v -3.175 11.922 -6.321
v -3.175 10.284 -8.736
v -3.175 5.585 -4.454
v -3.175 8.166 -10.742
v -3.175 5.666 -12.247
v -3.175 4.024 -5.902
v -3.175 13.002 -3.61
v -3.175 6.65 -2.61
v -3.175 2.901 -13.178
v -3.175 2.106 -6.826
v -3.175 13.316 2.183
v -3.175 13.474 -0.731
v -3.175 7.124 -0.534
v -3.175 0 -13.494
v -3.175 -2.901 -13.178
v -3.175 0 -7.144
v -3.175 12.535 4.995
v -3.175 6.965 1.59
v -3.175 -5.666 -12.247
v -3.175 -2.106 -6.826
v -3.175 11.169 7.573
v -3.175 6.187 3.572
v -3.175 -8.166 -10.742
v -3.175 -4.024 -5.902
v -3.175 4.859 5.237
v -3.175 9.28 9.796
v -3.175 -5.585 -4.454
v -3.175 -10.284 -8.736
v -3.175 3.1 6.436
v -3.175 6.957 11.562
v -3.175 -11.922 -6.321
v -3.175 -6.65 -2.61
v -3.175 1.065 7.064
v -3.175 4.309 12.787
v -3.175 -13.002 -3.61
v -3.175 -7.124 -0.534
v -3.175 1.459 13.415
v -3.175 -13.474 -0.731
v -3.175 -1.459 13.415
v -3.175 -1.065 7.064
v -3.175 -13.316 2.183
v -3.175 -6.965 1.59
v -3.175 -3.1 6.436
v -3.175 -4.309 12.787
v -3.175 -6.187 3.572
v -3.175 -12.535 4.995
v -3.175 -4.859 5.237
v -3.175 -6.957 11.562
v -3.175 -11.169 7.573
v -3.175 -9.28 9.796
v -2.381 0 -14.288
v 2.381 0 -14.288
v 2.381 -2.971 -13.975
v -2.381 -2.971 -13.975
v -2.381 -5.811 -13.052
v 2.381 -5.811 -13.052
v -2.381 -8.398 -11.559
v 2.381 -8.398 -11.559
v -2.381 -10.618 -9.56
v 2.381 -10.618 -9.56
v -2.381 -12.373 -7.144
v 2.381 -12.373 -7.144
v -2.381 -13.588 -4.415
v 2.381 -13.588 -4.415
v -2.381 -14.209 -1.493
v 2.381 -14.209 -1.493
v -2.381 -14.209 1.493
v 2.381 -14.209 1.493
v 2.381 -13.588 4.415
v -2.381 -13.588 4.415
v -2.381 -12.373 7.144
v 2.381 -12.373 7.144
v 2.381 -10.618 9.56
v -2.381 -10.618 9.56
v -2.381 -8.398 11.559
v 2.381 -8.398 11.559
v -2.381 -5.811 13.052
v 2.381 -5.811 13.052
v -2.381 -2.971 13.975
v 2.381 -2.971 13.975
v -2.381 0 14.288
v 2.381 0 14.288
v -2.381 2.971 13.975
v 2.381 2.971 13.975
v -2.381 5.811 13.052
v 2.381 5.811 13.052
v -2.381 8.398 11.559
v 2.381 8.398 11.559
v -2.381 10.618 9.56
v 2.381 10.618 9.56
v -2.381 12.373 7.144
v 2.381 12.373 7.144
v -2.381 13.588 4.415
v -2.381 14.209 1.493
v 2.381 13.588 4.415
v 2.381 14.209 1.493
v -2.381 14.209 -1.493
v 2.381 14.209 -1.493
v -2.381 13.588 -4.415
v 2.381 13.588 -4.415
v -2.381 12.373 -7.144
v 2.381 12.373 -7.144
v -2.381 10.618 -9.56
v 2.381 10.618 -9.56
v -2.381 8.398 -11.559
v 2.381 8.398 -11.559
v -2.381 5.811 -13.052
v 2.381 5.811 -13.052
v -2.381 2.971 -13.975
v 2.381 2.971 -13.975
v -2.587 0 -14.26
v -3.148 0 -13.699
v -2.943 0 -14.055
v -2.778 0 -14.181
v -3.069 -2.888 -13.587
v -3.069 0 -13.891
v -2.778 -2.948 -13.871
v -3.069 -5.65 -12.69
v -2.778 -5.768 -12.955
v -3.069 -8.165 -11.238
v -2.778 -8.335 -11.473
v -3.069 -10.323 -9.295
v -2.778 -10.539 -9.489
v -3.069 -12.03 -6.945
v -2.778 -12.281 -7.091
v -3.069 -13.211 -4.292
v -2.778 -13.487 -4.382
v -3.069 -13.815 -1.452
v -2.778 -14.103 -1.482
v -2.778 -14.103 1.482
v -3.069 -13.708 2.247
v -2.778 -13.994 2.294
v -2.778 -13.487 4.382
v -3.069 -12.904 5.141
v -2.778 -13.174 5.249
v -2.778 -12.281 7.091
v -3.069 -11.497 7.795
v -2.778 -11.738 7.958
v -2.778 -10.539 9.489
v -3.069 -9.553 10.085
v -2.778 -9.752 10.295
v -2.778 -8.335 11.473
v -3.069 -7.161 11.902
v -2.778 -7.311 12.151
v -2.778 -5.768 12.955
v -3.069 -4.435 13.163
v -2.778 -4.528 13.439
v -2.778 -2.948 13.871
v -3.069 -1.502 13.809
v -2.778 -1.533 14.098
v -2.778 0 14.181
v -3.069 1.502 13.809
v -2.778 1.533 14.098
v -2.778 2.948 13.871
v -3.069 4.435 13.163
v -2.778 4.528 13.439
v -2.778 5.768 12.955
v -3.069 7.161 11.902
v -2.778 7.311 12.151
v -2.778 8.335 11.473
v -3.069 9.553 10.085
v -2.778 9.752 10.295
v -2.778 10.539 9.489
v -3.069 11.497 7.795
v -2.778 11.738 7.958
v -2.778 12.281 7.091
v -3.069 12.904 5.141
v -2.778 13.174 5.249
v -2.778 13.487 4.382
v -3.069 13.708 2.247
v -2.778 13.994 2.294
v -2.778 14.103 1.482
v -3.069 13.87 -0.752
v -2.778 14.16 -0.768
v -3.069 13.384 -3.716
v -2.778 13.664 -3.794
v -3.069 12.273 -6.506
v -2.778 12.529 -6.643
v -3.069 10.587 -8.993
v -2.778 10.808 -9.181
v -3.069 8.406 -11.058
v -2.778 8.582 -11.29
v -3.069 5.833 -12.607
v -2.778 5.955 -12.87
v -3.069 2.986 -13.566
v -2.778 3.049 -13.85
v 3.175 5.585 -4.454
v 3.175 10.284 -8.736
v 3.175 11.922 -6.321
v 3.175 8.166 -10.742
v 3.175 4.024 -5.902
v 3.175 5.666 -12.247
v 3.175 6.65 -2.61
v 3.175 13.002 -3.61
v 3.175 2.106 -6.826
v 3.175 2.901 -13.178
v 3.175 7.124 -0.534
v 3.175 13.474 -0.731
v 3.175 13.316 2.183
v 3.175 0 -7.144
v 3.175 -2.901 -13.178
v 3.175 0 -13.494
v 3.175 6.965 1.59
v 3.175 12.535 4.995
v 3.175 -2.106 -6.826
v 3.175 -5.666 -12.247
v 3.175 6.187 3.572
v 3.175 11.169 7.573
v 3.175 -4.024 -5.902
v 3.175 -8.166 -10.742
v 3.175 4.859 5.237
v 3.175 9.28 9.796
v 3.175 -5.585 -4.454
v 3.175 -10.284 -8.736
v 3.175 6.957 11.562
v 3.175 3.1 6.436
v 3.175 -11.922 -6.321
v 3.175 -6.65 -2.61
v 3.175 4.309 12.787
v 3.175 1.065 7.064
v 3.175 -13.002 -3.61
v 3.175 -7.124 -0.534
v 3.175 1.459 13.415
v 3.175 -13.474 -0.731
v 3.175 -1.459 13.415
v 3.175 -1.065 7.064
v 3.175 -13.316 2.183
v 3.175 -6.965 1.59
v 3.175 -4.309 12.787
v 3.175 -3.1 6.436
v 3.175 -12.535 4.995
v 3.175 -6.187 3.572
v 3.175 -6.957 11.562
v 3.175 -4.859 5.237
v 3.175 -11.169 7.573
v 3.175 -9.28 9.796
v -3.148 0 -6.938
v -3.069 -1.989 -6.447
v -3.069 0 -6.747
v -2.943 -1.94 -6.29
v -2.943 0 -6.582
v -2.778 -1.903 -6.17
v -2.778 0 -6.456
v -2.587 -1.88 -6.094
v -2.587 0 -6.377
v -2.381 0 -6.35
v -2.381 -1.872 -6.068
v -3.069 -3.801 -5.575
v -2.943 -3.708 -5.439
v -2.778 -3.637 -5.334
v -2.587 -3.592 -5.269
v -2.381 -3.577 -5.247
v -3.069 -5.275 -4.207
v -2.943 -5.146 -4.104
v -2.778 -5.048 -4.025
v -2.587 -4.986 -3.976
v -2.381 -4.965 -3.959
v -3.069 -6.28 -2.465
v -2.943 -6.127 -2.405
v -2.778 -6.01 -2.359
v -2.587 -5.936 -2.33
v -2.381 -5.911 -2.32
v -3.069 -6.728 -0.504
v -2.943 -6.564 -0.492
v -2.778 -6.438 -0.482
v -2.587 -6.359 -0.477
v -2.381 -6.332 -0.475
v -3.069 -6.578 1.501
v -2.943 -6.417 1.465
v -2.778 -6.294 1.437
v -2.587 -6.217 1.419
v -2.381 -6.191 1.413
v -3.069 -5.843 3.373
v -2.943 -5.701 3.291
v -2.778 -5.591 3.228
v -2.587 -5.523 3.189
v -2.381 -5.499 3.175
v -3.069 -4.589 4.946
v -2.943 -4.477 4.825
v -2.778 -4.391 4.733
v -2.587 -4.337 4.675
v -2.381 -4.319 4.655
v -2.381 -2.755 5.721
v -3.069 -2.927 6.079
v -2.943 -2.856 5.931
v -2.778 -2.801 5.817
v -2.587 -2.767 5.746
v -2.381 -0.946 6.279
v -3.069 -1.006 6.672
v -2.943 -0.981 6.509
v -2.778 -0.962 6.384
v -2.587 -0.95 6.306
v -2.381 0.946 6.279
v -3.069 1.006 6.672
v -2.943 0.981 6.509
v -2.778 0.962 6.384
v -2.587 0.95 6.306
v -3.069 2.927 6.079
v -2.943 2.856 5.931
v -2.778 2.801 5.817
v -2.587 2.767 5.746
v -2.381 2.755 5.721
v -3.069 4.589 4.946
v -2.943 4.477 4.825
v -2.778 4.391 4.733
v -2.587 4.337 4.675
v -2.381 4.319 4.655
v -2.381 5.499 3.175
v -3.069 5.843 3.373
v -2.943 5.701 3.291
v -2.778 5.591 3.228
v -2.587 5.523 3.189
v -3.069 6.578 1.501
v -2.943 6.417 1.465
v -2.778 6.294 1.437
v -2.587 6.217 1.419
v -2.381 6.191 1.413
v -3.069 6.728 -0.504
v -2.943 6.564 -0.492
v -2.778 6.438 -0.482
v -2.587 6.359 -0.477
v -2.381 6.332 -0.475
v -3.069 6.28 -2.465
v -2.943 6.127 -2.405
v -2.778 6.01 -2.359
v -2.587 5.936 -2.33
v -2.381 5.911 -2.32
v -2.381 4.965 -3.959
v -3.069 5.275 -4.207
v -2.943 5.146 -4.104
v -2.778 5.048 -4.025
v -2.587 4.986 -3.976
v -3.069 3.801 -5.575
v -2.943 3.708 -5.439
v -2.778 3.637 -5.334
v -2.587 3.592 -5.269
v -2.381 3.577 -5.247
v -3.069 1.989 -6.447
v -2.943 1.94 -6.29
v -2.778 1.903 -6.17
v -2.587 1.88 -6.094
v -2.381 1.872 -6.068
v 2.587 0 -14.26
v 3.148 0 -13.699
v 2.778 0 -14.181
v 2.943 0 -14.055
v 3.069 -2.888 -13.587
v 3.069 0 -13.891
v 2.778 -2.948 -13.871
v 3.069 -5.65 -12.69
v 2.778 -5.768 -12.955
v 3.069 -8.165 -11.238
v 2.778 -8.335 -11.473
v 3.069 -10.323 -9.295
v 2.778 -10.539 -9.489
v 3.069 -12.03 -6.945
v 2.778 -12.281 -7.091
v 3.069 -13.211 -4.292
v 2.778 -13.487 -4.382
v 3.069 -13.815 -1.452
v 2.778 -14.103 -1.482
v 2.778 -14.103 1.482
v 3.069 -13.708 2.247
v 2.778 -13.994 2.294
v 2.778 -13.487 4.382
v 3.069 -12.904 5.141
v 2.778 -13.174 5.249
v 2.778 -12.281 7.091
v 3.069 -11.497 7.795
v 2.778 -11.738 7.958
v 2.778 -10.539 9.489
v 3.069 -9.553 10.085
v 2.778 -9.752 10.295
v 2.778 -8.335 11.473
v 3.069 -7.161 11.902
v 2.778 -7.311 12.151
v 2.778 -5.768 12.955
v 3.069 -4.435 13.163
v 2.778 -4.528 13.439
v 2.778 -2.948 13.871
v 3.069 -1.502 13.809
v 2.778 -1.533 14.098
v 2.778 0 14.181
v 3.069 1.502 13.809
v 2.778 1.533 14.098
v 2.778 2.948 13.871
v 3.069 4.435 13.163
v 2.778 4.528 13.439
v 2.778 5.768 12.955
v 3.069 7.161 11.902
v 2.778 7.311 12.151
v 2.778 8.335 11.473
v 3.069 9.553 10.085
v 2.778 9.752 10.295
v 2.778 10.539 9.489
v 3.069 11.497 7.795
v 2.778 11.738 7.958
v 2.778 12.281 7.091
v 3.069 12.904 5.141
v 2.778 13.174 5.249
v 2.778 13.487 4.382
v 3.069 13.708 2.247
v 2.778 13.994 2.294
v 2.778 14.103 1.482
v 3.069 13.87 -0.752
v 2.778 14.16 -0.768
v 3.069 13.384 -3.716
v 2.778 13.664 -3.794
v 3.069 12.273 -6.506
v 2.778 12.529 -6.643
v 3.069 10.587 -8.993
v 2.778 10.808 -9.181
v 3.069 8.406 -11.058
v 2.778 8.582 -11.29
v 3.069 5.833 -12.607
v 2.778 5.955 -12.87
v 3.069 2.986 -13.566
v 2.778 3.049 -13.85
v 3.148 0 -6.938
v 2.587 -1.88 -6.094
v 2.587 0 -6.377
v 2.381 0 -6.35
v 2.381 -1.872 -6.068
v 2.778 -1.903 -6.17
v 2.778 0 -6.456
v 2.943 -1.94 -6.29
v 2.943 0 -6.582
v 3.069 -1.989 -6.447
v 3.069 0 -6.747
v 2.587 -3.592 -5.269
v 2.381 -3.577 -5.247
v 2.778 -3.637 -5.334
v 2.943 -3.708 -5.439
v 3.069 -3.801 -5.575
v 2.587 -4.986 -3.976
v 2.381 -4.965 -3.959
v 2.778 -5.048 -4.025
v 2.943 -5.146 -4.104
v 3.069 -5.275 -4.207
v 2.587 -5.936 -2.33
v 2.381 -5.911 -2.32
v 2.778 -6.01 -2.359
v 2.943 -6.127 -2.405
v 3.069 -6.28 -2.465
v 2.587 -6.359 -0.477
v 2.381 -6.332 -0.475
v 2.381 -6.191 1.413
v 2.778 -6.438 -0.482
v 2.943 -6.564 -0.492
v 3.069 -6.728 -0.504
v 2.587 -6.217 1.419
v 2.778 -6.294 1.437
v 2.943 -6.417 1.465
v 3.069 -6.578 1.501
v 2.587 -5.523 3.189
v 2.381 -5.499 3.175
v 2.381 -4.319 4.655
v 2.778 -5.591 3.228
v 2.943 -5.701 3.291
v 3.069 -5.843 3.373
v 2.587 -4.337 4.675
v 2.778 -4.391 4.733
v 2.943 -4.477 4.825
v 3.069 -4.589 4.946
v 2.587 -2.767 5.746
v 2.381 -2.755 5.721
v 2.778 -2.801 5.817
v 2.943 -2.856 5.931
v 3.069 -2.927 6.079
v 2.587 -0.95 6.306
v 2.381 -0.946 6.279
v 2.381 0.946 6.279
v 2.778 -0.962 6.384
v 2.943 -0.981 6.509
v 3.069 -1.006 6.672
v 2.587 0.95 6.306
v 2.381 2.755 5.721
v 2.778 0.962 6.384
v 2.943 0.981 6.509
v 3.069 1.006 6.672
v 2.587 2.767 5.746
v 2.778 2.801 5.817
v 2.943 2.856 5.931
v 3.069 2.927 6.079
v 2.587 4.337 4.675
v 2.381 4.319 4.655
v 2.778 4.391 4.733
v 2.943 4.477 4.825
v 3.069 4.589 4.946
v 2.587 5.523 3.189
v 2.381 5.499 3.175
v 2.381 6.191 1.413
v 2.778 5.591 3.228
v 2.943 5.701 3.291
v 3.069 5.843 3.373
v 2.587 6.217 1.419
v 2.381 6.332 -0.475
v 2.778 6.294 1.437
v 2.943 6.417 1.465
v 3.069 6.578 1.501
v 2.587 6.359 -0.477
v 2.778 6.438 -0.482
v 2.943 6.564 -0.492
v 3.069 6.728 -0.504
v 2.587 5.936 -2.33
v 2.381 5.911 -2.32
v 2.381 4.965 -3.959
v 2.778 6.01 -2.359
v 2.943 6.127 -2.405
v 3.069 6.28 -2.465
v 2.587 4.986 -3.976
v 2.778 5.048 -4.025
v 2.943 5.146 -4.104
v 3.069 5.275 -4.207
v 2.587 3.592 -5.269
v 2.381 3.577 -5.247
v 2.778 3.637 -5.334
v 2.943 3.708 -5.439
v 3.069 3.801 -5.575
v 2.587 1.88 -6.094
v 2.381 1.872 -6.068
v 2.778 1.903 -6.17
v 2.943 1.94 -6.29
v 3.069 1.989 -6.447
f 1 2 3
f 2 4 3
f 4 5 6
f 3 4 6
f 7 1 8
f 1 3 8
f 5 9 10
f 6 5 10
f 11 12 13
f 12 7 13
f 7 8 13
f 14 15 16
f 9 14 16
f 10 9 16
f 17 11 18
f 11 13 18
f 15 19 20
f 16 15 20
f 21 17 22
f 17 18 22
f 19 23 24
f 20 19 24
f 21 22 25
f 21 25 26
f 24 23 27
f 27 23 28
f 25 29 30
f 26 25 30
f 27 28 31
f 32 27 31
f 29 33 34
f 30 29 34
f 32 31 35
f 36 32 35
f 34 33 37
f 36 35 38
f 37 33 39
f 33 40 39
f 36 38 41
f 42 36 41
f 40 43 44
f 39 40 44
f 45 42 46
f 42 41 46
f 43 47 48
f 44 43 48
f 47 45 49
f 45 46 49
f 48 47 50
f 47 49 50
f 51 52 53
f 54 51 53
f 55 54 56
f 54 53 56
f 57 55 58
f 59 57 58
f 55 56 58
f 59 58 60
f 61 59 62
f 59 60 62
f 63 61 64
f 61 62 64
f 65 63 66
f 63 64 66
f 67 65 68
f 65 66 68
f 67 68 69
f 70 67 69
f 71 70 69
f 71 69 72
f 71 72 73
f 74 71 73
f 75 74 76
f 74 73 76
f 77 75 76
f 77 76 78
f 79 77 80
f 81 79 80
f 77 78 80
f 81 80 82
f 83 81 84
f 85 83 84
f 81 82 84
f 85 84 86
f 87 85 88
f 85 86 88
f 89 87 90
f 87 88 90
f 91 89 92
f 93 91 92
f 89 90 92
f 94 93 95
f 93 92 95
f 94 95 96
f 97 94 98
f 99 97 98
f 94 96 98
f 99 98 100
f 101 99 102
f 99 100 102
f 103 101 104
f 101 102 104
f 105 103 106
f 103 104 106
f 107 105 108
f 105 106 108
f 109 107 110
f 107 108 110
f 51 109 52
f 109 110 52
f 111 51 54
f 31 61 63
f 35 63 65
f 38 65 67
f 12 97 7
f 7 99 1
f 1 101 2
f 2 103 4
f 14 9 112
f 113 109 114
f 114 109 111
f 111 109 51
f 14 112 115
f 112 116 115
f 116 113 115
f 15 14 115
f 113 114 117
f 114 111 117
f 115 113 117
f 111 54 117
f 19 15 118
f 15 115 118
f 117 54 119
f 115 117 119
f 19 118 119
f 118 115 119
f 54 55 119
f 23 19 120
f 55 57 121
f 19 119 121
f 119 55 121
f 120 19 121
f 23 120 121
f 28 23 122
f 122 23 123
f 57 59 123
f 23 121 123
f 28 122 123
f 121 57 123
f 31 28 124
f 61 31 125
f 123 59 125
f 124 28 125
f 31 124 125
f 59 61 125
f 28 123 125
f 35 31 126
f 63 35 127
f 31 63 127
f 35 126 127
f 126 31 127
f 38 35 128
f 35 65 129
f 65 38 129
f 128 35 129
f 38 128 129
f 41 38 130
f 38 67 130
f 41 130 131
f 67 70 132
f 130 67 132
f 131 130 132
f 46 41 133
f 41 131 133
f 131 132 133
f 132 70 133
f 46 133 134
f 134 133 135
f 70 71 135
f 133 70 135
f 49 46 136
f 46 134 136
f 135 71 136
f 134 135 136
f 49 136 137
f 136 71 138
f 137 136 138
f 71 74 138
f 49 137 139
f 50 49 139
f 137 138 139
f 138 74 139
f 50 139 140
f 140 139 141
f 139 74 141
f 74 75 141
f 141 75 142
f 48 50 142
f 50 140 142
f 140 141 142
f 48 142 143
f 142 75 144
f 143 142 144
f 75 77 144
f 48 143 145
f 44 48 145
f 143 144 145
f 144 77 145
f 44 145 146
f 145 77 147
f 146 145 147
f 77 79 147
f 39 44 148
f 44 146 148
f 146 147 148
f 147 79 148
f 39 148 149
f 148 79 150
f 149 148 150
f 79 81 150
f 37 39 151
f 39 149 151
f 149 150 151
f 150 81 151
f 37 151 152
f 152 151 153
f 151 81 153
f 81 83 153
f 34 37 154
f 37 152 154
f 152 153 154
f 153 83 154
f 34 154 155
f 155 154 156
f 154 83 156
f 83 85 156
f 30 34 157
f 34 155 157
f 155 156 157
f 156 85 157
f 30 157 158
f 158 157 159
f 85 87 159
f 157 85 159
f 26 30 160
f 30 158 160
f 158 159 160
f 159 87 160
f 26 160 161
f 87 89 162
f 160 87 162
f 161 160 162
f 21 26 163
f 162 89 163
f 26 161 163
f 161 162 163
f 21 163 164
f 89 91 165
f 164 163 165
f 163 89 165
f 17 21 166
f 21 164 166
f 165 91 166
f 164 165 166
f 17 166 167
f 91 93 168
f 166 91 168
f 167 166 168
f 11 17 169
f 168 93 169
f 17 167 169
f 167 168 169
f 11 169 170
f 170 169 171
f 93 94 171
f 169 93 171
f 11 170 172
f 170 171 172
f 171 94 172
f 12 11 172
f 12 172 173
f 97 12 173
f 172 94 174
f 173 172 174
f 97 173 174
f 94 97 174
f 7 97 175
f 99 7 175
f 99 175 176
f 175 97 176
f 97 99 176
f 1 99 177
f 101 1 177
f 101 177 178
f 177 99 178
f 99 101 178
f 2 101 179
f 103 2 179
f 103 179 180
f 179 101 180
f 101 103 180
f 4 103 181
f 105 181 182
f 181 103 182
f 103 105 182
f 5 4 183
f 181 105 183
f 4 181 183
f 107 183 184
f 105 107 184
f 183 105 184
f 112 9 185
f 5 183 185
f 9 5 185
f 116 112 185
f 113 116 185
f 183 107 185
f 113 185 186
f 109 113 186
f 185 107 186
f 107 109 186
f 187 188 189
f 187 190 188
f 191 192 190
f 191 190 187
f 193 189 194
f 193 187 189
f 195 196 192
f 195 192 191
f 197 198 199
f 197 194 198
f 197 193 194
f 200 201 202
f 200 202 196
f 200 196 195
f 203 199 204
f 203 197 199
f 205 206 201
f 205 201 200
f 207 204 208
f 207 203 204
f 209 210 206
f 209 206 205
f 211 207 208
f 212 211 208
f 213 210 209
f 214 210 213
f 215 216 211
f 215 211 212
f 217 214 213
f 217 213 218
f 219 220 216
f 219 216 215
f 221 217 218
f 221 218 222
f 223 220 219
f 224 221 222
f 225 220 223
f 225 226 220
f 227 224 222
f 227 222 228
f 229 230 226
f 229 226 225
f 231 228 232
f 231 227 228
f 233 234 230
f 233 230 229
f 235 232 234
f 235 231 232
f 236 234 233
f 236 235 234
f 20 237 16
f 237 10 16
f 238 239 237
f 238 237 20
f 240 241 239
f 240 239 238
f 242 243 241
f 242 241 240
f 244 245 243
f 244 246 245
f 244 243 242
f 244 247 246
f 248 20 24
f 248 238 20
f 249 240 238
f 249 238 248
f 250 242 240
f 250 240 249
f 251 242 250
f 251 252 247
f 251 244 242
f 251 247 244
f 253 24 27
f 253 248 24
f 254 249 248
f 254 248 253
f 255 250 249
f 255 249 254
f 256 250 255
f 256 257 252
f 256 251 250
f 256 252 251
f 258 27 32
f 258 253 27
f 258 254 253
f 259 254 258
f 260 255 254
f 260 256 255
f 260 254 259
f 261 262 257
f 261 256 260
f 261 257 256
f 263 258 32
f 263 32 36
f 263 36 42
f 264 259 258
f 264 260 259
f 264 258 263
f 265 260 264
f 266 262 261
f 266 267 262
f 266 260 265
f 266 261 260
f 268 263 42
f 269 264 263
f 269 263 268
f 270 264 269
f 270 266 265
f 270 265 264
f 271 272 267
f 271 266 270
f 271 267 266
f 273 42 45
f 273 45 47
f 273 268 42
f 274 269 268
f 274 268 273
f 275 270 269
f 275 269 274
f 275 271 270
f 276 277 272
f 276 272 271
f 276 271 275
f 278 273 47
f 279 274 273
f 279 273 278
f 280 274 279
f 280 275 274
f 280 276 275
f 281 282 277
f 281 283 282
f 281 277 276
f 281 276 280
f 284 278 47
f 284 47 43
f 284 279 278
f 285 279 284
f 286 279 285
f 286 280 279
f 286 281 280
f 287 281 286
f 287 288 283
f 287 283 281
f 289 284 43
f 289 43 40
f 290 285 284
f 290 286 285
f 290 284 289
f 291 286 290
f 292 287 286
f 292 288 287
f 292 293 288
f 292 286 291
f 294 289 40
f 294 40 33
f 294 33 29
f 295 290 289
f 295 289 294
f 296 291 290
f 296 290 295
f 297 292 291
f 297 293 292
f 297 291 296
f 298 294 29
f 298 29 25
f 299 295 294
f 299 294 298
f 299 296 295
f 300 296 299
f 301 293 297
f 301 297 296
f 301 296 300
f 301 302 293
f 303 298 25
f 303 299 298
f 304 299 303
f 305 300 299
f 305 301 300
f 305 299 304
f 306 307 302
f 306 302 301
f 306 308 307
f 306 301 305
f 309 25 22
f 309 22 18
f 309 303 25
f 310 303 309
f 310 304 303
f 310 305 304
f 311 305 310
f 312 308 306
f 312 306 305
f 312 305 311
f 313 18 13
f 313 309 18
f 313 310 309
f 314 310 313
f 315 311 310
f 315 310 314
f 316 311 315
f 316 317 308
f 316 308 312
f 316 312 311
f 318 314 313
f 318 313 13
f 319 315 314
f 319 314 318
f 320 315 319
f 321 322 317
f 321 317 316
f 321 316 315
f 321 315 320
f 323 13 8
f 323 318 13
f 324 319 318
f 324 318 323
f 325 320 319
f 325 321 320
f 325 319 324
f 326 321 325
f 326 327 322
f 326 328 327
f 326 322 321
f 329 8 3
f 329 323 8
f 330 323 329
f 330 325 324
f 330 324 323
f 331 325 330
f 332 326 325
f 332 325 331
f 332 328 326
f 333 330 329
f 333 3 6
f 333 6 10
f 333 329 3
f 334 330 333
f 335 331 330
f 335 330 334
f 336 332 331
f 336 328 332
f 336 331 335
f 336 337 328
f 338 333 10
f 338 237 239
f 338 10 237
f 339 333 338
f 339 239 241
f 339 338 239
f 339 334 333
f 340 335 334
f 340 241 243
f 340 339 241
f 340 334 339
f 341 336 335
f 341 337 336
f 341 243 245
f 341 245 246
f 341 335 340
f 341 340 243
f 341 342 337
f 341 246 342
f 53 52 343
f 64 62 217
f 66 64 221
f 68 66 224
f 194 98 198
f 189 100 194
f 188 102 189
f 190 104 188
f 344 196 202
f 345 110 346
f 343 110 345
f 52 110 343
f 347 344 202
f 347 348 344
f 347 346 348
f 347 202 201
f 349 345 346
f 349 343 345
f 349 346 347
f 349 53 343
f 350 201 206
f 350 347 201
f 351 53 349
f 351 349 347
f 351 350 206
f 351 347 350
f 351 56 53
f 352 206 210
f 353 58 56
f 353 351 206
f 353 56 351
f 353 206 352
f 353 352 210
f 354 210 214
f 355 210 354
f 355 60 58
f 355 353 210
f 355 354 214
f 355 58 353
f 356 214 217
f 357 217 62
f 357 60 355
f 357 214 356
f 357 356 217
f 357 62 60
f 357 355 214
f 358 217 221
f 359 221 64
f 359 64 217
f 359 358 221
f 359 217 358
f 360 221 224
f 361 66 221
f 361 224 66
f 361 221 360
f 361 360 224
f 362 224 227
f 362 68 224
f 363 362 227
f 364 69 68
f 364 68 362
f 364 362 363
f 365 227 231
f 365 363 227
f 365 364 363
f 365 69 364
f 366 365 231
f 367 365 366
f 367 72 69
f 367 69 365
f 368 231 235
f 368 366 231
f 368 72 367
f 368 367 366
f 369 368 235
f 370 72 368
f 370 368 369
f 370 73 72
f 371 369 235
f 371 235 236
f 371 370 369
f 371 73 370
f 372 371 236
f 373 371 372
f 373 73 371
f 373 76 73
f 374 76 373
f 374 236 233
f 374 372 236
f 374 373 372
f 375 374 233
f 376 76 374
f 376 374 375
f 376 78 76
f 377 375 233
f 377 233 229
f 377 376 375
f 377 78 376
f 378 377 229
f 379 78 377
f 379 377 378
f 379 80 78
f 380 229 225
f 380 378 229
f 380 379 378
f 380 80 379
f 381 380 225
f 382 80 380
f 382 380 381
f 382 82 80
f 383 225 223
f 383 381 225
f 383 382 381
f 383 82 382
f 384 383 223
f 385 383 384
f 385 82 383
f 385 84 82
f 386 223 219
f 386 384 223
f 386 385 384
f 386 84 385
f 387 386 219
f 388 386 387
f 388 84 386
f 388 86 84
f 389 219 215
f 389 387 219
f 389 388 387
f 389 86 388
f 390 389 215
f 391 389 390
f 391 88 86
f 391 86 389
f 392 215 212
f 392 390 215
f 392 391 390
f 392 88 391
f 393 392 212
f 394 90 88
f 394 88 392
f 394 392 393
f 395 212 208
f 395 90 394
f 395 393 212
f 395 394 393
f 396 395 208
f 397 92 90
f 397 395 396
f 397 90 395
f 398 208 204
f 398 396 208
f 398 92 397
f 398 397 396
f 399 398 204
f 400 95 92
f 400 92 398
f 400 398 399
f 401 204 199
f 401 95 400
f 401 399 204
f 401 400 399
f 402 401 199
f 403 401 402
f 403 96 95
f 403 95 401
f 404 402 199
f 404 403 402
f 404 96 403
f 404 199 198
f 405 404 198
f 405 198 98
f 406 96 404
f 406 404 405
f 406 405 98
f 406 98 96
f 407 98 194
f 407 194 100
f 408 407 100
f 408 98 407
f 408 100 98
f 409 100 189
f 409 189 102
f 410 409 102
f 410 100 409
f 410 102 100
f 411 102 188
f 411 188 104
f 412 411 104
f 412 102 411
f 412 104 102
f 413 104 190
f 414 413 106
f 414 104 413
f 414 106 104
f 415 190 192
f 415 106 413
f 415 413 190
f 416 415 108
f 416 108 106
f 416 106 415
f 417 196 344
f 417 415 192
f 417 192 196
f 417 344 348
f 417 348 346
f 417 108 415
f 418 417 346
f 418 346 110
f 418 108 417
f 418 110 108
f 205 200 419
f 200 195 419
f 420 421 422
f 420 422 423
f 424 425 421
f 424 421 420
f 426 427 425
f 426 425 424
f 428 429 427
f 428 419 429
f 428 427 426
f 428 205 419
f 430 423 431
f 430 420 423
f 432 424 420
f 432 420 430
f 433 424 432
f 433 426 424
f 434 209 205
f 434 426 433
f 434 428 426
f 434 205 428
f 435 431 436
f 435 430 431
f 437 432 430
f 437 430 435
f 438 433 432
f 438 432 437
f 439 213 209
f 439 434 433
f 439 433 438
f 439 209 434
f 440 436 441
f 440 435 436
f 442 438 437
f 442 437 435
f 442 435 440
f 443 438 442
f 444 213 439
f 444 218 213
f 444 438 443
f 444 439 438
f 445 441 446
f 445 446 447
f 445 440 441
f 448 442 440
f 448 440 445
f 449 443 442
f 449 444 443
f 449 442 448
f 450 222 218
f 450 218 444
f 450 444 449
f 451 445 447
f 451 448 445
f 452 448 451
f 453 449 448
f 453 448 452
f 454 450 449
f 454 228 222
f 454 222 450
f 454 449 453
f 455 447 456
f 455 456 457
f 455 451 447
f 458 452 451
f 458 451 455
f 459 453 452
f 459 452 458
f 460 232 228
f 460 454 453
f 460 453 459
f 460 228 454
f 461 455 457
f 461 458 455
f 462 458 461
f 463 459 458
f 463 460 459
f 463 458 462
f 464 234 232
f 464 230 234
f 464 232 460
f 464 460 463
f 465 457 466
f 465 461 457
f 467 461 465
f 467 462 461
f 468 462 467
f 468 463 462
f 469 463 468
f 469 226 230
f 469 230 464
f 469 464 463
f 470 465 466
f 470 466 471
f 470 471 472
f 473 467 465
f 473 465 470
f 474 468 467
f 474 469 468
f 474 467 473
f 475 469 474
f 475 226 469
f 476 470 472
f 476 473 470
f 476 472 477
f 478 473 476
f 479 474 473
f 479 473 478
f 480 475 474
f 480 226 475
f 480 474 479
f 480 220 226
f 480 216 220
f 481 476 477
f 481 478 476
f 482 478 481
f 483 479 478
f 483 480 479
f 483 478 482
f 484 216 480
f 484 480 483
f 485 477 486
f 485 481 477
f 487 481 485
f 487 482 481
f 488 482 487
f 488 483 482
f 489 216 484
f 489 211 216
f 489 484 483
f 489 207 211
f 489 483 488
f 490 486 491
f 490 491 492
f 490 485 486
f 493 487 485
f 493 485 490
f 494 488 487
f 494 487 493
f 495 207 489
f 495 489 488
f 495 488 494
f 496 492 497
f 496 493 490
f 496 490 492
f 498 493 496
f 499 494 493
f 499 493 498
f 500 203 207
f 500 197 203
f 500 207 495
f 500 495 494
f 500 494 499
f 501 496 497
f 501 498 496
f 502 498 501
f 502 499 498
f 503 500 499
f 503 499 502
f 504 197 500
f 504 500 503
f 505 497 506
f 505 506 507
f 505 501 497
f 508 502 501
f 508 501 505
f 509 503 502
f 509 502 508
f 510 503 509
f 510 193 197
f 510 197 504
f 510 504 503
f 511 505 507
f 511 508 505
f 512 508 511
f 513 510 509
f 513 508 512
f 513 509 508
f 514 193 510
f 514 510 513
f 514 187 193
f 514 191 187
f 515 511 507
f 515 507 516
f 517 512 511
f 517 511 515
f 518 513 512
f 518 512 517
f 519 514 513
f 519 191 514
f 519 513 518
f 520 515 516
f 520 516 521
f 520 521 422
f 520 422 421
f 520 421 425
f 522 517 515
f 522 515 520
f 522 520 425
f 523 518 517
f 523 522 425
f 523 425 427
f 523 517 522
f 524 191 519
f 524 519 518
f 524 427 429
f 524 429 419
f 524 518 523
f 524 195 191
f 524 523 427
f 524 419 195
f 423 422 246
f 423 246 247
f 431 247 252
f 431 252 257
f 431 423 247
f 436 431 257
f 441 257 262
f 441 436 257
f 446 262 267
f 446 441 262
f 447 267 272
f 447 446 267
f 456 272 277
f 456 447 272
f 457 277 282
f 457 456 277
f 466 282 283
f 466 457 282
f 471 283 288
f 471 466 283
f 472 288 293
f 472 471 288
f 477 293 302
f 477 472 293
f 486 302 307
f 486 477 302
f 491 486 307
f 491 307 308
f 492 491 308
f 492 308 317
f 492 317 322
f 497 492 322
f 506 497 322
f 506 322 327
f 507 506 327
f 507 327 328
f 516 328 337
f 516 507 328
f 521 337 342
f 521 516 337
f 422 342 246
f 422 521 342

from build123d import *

# Parameters (mm, degrees)
SKETCH1_W = 6.35
SKETCH1_H = 7.9375
FILLET1_R = 0.79375


with BuildPart() as part:
    # Sketch1 → Revolve1 (revolve)
    with BuildSketch(Plane.XY, mode=Mode.PRIVATE) as revolve1_sk:
        with Locations((0, 10.31875)):
            Rectangle(SKETCH1_W, SKETCH1_H)
    revolve(revolve1_sk.sketch.rotate(Axis((0, 0, 0), (-1, 0, 0)), 90), axis=Axis((0, 0, 0), (-1, 0, 0)))

    # Fillet1
    fillet1_edges = [part.edges().sort_by_distance(p)[0] for p in [
        (-3.175, 0, 14.2875),
        (3.175, 0, 14.2875),
        (3.175, 0, 6.35),
        (-3.175, 0, 6.35),
    ]]
    fillet(fillet1_edges, radius=FILLET1_R)


solid = part.part
